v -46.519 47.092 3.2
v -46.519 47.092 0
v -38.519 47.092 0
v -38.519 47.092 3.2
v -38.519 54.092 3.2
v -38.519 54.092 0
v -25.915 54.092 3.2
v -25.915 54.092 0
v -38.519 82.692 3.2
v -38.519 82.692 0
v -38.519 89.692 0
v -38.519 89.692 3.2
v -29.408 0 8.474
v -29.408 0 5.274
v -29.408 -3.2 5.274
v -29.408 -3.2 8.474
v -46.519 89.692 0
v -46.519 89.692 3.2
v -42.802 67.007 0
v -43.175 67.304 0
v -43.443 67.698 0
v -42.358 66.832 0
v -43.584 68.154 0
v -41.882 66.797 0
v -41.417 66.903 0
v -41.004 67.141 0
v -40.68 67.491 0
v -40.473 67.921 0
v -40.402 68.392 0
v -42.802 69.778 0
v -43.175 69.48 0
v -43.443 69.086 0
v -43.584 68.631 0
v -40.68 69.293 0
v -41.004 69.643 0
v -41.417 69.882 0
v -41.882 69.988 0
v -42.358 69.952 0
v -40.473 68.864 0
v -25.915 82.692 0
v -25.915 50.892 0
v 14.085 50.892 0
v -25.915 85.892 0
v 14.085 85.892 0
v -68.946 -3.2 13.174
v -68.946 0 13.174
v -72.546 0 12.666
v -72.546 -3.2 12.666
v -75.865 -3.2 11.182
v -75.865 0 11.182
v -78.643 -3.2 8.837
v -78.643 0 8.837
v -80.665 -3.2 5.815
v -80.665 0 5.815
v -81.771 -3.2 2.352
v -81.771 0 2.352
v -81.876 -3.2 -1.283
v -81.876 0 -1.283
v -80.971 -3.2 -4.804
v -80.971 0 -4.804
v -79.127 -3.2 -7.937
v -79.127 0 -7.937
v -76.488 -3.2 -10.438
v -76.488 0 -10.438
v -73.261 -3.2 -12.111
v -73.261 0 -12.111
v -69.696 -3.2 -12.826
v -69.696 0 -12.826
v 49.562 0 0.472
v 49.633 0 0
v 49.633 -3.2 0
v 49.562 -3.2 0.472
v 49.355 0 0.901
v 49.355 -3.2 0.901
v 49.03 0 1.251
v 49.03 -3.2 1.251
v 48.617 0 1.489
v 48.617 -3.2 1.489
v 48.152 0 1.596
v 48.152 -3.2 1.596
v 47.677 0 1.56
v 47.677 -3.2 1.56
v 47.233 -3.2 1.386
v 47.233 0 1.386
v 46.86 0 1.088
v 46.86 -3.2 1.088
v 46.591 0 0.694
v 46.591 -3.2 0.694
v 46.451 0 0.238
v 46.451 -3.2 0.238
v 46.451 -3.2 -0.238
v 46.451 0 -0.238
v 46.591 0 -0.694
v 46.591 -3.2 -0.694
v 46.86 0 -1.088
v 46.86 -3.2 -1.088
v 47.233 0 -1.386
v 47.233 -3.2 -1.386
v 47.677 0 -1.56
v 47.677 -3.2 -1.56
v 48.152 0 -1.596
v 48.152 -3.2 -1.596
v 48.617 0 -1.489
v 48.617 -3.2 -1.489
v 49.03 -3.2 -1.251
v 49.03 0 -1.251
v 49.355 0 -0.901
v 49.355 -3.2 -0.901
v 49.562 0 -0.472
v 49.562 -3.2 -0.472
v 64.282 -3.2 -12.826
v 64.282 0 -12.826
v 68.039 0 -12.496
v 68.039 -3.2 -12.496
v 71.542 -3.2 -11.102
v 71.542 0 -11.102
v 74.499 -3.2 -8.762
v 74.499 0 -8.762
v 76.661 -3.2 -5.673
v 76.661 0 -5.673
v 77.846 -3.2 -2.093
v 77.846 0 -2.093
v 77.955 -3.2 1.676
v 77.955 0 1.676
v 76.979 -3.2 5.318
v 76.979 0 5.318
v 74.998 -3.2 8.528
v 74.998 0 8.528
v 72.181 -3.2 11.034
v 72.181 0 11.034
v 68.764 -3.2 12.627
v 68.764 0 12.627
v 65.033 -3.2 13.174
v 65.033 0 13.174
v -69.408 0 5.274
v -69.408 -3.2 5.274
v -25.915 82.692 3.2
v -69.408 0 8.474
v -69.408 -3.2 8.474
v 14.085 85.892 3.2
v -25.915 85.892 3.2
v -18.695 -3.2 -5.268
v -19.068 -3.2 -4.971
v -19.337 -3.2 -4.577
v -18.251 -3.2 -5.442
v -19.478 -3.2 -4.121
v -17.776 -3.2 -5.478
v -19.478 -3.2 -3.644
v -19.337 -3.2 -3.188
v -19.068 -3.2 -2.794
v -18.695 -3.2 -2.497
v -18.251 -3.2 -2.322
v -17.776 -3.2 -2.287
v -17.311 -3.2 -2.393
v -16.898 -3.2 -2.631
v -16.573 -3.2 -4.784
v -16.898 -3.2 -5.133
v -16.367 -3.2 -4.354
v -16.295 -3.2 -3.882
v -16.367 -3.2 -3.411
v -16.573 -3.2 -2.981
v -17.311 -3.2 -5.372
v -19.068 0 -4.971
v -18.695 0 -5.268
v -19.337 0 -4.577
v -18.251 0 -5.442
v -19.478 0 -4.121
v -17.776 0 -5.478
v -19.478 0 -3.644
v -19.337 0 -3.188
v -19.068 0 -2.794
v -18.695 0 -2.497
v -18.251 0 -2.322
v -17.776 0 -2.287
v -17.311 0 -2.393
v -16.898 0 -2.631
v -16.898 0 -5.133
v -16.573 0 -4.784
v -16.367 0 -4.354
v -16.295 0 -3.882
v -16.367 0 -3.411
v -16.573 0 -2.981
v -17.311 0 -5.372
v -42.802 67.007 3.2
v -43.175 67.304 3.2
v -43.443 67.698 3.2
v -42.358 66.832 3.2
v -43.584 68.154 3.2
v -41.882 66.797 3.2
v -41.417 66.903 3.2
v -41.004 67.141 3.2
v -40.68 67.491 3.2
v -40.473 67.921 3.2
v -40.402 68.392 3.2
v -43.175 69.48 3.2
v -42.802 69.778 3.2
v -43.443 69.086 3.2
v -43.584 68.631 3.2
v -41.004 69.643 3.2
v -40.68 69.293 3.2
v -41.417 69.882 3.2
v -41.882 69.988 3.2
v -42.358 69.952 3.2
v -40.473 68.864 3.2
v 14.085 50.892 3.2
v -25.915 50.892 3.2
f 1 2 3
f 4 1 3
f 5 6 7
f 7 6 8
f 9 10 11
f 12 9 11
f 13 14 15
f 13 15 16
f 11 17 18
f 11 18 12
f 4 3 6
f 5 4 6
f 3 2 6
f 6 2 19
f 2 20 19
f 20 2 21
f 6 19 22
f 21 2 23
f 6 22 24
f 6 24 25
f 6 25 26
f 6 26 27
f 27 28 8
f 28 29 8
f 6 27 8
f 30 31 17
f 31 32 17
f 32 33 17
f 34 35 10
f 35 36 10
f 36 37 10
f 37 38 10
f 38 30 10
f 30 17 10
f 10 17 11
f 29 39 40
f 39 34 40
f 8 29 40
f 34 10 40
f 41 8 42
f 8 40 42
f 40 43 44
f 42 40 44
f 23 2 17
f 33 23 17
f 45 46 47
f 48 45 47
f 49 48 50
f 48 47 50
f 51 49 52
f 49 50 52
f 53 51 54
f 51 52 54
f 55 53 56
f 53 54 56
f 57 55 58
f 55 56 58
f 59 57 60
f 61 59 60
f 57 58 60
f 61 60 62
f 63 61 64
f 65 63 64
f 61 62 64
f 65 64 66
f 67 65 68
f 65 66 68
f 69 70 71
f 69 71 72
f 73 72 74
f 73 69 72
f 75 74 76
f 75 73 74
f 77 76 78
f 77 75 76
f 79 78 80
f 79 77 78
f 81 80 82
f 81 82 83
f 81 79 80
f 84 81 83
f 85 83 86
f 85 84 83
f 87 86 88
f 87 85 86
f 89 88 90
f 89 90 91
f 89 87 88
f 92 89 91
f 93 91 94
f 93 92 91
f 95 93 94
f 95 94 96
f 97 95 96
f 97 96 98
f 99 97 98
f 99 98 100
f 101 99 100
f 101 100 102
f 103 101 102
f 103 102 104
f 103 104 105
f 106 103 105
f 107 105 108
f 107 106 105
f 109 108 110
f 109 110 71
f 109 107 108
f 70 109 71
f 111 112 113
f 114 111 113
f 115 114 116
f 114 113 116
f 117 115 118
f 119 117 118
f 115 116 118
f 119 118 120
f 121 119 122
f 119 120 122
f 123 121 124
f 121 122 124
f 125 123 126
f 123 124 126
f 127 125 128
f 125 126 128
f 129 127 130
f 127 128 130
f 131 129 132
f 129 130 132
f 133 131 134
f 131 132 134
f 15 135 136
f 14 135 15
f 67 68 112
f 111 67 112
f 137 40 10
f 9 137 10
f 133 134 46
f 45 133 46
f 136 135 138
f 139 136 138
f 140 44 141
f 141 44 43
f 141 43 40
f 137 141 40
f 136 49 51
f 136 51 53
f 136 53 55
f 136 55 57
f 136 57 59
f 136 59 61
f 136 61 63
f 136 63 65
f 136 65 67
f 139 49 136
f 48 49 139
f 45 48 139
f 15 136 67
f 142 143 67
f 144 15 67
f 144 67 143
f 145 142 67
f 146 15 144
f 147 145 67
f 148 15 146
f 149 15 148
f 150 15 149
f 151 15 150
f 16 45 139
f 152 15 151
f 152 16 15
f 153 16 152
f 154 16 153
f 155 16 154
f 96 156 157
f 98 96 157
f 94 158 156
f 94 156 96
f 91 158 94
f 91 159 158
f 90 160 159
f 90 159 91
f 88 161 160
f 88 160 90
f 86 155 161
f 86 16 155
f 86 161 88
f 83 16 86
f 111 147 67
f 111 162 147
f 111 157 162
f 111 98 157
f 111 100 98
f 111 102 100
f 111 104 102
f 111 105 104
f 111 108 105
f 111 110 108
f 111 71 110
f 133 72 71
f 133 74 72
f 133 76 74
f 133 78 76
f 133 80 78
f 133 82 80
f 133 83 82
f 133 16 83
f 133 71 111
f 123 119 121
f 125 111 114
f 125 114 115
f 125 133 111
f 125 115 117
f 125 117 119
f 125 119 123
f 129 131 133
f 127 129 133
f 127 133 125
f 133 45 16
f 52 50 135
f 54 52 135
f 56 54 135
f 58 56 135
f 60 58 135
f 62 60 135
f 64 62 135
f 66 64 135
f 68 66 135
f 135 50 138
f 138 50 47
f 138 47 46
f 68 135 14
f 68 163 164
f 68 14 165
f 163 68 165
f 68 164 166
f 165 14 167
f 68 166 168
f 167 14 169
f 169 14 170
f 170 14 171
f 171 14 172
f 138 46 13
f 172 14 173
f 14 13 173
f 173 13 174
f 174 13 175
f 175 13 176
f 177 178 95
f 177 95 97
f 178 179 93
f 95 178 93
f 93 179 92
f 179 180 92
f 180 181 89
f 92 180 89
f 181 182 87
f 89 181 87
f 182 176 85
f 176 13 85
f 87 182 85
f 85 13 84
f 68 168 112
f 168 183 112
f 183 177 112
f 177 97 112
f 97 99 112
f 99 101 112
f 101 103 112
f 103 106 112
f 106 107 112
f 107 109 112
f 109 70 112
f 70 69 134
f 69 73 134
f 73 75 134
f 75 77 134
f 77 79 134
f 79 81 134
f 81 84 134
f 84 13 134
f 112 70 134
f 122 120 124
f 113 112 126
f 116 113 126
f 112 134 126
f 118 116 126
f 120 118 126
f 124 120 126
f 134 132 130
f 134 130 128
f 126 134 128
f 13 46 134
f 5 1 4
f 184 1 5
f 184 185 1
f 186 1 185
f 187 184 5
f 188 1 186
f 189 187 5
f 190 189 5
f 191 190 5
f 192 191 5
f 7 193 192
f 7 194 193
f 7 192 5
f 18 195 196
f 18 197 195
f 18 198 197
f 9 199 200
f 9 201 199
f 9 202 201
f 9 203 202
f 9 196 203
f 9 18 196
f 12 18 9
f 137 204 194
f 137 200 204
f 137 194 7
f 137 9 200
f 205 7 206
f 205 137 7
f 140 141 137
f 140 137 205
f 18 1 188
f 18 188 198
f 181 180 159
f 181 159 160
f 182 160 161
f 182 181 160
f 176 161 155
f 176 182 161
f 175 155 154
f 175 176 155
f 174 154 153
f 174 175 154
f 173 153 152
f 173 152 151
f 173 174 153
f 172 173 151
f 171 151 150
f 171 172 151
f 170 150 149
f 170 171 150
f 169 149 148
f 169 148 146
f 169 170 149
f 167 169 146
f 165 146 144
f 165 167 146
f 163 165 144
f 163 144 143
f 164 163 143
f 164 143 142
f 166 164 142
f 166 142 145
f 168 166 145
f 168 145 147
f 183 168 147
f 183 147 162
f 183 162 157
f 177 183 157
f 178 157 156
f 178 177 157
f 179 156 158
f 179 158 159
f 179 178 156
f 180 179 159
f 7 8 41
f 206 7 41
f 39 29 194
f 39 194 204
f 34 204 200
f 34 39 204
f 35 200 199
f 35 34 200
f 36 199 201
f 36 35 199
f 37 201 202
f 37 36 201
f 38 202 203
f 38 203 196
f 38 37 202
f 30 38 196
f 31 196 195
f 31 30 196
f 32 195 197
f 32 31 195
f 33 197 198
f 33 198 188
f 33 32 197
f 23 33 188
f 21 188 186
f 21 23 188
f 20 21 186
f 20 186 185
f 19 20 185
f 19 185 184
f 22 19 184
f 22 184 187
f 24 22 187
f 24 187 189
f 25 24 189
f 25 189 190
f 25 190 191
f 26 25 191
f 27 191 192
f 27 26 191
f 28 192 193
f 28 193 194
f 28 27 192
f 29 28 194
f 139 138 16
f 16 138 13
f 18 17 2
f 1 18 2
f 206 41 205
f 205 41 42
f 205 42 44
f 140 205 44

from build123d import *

# Parameters (mm, degrees)
F0_R     = 1.6
F0_W     = 40
F0_H     = 3.2
F1_DEPTH = 3.2
F2_R     = 1.6
F2_W     = 39.3956717427
F2_H     = 28.6
F2_W_2   = 8
F2_H_2   = 7
F3_DEPTH = 3.2


# Not quite as in the source:
# - a feature names something its author has since deleted; it is built from what else it names


with BuildPart() as f1:
    # F0 (on Front) → F1 (new body)
    with BuildSketch(Plane.XZ):
        with BuildLine():
            ThreePointArc((64.2822751435, -12.8260802654), (78.0380924464, -0.2122674413), (65.0326790919, 13.1739197346))
            Line((65.0326790919, 13.1739197346), (-68.9456731455, 13.1739197346))
            ThreePointArc((-68.9456731455, 13.1739197346), (-81.9510814202, 0.5382828094), (-69.6957248565, -12.8260802654))
            Line((-69.6957248565, -12.8260802654), (64.2822751435, -12.8260802654))
        make_face()
        with Locations((-17.8954396397, -3.8823541254)):
            Circle(F0_R, mode=Mode.SUBTRACT)
        with Locations((48.0326790919, 0)):
            Circle(F0_R, mode=Mode.SUBTRACT)
        with Locations((-49.4083422422, 6.8739197346)):
            Rectangle(F0_W, F0_H, mode=Mode.SUBTRACT)
    extrude(amount=F1_DEPTH)


with BuildPart() as f3:
    # F2 (on Top) → F3 (new body)
    with BuildSketch(Plane.XY):
        Polygon((14.0854157835, 50.8921488531), (14.0854157835, 85.8921488531), (-25.9145842165, 85.8921488531), (-25.9145842165, 82.6921488531), (13.4810875262, 82.6921488531), (13.4810875262, 54.0921488531), (-25.9145842165, 54.0921488531), (-25.9145842165, 50.8921488531), align=None)
        Polygon((-25.9145842165, 54.0921488531), (-25.9145842165, 82.6921488531), (-38.5189124738, 82.6921488531), (-46.5189124738, 82.6921488531), (-46.5189124738, 54.0921488531), (-38.5189124738, 54.0921488531), align=None)
        with Locations((-42.0019124738, 68.3921488531)):
            Circle(F2_R, mode=Mode.SUBTRACT)
        with Locations((-6.2167483452, 68.3921488531)):
            Rectangle(F2_W, F2_H)
        with Locations((-42.5189124738, 86.1921488531)):
            Rectangle(F2_W_2, F2_H_2)
        with Locations((-42.5189124738, 50.5921488531)):
            Rectangle(F2_W_2, F2_H_2)
    extrude(amount=F3_DEPTH)


solid = Compound([f1.part, f3.part])
